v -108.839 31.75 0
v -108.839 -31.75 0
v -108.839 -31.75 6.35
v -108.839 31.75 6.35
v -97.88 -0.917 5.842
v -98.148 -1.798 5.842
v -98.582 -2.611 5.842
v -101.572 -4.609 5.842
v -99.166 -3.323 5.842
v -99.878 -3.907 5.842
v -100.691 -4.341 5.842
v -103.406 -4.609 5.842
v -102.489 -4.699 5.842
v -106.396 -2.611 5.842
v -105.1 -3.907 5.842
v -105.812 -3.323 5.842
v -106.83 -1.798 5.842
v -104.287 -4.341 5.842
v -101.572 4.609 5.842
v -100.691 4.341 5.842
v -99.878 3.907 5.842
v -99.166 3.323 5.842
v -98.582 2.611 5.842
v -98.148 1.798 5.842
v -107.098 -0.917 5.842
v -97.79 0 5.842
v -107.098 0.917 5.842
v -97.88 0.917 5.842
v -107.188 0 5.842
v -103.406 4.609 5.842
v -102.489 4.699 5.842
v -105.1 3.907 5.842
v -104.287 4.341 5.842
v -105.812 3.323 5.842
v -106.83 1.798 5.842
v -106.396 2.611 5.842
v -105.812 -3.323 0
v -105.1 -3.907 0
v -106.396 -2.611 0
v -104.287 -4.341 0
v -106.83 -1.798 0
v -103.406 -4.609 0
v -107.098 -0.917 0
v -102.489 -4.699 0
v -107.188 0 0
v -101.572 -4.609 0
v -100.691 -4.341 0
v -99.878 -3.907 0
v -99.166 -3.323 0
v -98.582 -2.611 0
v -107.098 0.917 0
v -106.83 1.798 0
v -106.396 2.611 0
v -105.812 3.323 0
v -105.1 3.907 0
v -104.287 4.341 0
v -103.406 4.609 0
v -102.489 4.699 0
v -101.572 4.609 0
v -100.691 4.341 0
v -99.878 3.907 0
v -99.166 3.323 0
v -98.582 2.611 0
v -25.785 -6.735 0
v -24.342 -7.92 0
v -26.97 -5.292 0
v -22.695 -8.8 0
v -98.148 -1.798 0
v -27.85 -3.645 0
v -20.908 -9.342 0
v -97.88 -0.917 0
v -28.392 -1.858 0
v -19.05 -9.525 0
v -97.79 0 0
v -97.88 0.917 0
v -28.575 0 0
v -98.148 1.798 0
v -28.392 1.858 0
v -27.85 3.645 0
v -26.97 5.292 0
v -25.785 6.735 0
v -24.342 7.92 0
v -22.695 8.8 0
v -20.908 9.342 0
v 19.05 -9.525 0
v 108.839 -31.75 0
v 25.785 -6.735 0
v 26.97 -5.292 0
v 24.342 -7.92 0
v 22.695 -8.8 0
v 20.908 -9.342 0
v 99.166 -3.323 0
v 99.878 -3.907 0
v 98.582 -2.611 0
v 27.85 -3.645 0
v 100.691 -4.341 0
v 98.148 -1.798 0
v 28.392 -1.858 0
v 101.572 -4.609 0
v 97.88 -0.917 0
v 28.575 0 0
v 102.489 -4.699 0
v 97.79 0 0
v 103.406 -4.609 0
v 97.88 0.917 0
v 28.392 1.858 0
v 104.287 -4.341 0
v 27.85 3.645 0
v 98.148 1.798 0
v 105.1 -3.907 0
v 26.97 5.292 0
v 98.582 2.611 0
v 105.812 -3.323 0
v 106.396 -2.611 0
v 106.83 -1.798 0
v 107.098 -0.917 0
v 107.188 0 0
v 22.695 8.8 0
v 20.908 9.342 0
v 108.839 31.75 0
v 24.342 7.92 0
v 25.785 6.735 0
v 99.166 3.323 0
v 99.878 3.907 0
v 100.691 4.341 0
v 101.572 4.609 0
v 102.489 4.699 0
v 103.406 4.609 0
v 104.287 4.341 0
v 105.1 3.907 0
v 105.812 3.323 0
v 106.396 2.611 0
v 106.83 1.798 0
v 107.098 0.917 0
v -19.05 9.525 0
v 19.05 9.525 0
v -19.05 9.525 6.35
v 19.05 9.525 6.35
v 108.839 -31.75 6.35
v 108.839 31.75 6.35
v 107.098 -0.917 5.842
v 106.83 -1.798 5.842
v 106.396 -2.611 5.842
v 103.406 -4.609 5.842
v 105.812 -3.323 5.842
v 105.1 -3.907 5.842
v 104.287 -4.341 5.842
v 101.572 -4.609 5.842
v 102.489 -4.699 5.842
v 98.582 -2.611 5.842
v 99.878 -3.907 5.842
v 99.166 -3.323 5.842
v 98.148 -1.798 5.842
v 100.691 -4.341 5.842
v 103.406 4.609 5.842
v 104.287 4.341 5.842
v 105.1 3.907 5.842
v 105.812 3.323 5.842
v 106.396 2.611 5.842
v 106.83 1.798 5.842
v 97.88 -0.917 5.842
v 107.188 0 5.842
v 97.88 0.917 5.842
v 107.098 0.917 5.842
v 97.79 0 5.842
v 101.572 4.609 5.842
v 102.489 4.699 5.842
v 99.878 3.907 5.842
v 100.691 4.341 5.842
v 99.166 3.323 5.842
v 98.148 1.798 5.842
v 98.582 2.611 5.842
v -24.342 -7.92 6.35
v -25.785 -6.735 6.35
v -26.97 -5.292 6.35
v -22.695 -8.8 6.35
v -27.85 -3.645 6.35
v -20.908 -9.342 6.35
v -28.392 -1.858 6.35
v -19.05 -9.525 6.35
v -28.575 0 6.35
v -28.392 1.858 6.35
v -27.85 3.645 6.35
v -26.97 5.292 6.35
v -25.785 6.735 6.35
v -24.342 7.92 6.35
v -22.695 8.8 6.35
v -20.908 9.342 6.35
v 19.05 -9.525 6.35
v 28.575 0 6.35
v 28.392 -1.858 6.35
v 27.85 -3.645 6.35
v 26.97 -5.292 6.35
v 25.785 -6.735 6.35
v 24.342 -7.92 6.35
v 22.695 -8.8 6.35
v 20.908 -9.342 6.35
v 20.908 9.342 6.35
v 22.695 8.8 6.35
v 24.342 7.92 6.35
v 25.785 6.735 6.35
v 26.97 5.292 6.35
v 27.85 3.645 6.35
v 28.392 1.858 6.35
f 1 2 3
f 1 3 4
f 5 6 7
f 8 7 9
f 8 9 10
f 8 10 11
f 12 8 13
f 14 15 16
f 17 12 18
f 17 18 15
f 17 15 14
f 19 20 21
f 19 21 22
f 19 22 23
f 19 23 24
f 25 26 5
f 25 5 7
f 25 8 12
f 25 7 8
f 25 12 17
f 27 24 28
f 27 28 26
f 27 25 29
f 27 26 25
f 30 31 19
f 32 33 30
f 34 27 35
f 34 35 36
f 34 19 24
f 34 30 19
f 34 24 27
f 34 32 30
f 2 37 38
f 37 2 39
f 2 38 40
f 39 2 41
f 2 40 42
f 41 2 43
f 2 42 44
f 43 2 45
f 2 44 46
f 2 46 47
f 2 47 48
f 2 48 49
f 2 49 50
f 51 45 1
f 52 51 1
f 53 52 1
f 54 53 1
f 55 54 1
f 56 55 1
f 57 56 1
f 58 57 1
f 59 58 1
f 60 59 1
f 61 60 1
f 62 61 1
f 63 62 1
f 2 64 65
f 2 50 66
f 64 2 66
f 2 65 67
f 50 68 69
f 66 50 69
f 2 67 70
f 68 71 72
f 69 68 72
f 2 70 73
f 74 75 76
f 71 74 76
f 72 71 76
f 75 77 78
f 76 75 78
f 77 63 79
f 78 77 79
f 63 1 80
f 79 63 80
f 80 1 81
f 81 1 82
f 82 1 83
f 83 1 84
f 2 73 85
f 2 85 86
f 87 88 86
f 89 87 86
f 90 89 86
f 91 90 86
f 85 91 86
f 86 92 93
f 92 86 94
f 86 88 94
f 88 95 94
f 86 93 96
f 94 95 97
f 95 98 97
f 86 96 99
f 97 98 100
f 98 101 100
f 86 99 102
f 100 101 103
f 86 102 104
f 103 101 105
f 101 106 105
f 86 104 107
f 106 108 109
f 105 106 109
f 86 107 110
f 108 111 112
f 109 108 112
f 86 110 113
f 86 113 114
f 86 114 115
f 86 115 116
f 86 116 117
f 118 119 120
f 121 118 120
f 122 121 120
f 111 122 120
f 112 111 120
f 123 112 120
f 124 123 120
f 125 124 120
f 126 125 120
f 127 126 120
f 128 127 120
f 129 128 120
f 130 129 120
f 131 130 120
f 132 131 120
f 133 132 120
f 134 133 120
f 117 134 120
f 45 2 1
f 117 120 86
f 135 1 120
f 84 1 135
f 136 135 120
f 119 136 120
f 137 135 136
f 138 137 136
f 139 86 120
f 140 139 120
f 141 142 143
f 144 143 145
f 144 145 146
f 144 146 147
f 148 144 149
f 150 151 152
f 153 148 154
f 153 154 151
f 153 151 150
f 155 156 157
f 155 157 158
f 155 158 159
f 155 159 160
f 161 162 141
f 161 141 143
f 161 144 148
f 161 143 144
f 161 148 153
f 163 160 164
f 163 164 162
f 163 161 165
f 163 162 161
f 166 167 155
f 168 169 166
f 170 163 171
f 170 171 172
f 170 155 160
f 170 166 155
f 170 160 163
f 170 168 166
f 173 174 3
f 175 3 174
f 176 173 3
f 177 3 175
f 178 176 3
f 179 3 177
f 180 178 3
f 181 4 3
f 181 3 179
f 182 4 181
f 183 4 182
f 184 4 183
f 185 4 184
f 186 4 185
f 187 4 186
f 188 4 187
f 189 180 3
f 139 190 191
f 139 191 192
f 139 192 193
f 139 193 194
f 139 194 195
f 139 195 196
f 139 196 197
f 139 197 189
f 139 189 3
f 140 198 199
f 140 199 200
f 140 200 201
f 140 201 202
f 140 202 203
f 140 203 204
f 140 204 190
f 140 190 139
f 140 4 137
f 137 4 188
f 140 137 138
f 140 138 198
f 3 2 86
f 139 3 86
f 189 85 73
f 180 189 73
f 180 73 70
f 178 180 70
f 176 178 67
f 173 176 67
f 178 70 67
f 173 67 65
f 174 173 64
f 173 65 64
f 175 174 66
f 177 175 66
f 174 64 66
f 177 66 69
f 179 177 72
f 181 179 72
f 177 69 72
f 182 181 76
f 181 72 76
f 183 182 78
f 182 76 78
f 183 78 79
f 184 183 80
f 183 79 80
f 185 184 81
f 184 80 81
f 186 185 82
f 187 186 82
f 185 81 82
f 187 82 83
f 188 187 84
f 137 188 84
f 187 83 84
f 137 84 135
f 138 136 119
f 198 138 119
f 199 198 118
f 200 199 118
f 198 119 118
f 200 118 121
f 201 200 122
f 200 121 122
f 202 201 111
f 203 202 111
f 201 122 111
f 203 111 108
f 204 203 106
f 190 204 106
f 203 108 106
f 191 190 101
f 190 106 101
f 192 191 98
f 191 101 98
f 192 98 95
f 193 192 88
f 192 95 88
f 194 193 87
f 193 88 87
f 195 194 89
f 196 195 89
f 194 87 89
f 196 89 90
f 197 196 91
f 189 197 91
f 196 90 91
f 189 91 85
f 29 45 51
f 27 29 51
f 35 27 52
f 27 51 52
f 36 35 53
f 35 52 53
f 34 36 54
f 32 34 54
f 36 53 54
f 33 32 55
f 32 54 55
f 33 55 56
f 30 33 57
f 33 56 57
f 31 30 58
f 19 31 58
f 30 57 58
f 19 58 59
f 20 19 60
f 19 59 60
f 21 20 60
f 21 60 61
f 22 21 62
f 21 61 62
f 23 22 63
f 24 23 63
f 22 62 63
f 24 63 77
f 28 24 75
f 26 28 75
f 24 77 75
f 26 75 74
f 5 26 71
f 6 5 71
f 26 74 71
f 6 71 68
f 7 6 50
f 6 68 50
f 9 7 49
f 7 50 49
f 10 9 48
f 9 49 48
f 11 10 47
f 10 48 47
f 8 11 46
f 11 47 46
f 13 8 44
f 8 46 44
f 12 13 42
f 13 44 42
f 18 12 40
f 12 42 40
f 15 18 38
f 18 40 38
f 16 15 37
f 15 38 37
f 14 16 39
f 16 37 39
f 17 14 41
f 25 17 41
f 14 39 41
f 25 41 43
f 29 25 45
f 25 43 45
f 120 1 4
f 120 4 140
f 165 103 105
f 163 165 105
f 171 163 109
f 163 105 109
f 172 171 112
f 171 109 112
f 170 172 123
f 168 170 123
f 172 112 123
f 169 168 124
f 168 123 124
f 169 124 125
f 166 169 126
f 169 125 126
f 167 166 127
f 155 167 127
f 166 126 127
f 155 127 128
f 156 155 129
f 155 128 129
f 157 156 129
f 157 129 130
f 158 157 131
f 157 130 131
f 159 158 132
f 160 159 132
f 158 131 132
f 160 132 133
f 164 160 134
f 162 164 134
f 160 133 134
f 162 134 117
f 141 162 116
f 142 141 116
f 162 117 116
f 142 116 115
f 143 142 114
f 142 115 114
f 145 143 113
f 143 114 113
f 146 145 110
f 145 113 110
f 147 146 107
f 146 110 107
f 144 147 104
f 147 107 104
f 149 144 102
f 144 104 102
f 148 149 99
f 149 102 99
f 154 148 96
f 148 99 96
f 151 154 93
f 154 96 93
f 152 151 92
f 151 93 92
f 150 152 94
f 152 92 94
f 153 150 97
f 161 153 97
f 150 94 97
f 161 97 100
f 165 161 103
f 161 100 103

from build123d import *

# Parameters (mm, degrees)
SKETCH1_W               = 217.678
SKETCH1_H               = 63.5
BOSS_EXTRUDE1_DEPTH     = 6.35
CUT_EXTRUDE1_DEPTH      = 114.553128187
CUT_EXTRUDE1_DEPTH_BACK = 114.553128187
SKETCH3_R               = 4.699
CUT_EXTRUDE2_DEPTH      = 5.842


with BuildPart() as part:
    # Sketch1 → Boss-Extrude1 (new body)
    with BuildSketch(Plane.XY):
        Rectangle(SKETCH1_W, SKETCH1_H)
    extrude(amount=BOSS_EXTRUDE1_DEPTH)

    # Sketch2 → Cut-Extrude1 (cut, two sides: drawn at the far end of the back side and taken through both)
    with BuildSketch(Plane.XY.offset(6.35).offset(-CUT_EXTRUDE1_DEPTH_BACK)):
        with BuildLine():
            Line((19.05, -9.525), (-19.05, -9.525))
            ThreePointArc((-19.05, -9.525), (-28.575, 0), (-19.05, 9.525))
            Line((-19.05, 9.525), (19.05, 9.525))
            ThreePointArc((19.05, 9.525), (28.575, 0), (19.05, -9.525))
        make_face()
    extrude(amount=CUT_EXTRUDE1_DEPTH + CUT_EXTRUDE1_DEPTH_BACK, mode=Mode.SUBTRACT)

    # Sketch3 → Cut-Extrude2 (cut)
    with BuildSketch(Plane(origin=(0, 0, 0), x_dir=(-1, 0, 0), z_dir=(0, 0, -1))):
        with Locations((-102.489, 0)):
            Circle(SKETCH3_R)
        with Locations((102.489, 0)):
            Circle(SKETCH3_R)
    extrude(amount=-CUT_EXTRUDE2_DEPTH, mode=Mode.SUBTRACT)


solid = part.part
